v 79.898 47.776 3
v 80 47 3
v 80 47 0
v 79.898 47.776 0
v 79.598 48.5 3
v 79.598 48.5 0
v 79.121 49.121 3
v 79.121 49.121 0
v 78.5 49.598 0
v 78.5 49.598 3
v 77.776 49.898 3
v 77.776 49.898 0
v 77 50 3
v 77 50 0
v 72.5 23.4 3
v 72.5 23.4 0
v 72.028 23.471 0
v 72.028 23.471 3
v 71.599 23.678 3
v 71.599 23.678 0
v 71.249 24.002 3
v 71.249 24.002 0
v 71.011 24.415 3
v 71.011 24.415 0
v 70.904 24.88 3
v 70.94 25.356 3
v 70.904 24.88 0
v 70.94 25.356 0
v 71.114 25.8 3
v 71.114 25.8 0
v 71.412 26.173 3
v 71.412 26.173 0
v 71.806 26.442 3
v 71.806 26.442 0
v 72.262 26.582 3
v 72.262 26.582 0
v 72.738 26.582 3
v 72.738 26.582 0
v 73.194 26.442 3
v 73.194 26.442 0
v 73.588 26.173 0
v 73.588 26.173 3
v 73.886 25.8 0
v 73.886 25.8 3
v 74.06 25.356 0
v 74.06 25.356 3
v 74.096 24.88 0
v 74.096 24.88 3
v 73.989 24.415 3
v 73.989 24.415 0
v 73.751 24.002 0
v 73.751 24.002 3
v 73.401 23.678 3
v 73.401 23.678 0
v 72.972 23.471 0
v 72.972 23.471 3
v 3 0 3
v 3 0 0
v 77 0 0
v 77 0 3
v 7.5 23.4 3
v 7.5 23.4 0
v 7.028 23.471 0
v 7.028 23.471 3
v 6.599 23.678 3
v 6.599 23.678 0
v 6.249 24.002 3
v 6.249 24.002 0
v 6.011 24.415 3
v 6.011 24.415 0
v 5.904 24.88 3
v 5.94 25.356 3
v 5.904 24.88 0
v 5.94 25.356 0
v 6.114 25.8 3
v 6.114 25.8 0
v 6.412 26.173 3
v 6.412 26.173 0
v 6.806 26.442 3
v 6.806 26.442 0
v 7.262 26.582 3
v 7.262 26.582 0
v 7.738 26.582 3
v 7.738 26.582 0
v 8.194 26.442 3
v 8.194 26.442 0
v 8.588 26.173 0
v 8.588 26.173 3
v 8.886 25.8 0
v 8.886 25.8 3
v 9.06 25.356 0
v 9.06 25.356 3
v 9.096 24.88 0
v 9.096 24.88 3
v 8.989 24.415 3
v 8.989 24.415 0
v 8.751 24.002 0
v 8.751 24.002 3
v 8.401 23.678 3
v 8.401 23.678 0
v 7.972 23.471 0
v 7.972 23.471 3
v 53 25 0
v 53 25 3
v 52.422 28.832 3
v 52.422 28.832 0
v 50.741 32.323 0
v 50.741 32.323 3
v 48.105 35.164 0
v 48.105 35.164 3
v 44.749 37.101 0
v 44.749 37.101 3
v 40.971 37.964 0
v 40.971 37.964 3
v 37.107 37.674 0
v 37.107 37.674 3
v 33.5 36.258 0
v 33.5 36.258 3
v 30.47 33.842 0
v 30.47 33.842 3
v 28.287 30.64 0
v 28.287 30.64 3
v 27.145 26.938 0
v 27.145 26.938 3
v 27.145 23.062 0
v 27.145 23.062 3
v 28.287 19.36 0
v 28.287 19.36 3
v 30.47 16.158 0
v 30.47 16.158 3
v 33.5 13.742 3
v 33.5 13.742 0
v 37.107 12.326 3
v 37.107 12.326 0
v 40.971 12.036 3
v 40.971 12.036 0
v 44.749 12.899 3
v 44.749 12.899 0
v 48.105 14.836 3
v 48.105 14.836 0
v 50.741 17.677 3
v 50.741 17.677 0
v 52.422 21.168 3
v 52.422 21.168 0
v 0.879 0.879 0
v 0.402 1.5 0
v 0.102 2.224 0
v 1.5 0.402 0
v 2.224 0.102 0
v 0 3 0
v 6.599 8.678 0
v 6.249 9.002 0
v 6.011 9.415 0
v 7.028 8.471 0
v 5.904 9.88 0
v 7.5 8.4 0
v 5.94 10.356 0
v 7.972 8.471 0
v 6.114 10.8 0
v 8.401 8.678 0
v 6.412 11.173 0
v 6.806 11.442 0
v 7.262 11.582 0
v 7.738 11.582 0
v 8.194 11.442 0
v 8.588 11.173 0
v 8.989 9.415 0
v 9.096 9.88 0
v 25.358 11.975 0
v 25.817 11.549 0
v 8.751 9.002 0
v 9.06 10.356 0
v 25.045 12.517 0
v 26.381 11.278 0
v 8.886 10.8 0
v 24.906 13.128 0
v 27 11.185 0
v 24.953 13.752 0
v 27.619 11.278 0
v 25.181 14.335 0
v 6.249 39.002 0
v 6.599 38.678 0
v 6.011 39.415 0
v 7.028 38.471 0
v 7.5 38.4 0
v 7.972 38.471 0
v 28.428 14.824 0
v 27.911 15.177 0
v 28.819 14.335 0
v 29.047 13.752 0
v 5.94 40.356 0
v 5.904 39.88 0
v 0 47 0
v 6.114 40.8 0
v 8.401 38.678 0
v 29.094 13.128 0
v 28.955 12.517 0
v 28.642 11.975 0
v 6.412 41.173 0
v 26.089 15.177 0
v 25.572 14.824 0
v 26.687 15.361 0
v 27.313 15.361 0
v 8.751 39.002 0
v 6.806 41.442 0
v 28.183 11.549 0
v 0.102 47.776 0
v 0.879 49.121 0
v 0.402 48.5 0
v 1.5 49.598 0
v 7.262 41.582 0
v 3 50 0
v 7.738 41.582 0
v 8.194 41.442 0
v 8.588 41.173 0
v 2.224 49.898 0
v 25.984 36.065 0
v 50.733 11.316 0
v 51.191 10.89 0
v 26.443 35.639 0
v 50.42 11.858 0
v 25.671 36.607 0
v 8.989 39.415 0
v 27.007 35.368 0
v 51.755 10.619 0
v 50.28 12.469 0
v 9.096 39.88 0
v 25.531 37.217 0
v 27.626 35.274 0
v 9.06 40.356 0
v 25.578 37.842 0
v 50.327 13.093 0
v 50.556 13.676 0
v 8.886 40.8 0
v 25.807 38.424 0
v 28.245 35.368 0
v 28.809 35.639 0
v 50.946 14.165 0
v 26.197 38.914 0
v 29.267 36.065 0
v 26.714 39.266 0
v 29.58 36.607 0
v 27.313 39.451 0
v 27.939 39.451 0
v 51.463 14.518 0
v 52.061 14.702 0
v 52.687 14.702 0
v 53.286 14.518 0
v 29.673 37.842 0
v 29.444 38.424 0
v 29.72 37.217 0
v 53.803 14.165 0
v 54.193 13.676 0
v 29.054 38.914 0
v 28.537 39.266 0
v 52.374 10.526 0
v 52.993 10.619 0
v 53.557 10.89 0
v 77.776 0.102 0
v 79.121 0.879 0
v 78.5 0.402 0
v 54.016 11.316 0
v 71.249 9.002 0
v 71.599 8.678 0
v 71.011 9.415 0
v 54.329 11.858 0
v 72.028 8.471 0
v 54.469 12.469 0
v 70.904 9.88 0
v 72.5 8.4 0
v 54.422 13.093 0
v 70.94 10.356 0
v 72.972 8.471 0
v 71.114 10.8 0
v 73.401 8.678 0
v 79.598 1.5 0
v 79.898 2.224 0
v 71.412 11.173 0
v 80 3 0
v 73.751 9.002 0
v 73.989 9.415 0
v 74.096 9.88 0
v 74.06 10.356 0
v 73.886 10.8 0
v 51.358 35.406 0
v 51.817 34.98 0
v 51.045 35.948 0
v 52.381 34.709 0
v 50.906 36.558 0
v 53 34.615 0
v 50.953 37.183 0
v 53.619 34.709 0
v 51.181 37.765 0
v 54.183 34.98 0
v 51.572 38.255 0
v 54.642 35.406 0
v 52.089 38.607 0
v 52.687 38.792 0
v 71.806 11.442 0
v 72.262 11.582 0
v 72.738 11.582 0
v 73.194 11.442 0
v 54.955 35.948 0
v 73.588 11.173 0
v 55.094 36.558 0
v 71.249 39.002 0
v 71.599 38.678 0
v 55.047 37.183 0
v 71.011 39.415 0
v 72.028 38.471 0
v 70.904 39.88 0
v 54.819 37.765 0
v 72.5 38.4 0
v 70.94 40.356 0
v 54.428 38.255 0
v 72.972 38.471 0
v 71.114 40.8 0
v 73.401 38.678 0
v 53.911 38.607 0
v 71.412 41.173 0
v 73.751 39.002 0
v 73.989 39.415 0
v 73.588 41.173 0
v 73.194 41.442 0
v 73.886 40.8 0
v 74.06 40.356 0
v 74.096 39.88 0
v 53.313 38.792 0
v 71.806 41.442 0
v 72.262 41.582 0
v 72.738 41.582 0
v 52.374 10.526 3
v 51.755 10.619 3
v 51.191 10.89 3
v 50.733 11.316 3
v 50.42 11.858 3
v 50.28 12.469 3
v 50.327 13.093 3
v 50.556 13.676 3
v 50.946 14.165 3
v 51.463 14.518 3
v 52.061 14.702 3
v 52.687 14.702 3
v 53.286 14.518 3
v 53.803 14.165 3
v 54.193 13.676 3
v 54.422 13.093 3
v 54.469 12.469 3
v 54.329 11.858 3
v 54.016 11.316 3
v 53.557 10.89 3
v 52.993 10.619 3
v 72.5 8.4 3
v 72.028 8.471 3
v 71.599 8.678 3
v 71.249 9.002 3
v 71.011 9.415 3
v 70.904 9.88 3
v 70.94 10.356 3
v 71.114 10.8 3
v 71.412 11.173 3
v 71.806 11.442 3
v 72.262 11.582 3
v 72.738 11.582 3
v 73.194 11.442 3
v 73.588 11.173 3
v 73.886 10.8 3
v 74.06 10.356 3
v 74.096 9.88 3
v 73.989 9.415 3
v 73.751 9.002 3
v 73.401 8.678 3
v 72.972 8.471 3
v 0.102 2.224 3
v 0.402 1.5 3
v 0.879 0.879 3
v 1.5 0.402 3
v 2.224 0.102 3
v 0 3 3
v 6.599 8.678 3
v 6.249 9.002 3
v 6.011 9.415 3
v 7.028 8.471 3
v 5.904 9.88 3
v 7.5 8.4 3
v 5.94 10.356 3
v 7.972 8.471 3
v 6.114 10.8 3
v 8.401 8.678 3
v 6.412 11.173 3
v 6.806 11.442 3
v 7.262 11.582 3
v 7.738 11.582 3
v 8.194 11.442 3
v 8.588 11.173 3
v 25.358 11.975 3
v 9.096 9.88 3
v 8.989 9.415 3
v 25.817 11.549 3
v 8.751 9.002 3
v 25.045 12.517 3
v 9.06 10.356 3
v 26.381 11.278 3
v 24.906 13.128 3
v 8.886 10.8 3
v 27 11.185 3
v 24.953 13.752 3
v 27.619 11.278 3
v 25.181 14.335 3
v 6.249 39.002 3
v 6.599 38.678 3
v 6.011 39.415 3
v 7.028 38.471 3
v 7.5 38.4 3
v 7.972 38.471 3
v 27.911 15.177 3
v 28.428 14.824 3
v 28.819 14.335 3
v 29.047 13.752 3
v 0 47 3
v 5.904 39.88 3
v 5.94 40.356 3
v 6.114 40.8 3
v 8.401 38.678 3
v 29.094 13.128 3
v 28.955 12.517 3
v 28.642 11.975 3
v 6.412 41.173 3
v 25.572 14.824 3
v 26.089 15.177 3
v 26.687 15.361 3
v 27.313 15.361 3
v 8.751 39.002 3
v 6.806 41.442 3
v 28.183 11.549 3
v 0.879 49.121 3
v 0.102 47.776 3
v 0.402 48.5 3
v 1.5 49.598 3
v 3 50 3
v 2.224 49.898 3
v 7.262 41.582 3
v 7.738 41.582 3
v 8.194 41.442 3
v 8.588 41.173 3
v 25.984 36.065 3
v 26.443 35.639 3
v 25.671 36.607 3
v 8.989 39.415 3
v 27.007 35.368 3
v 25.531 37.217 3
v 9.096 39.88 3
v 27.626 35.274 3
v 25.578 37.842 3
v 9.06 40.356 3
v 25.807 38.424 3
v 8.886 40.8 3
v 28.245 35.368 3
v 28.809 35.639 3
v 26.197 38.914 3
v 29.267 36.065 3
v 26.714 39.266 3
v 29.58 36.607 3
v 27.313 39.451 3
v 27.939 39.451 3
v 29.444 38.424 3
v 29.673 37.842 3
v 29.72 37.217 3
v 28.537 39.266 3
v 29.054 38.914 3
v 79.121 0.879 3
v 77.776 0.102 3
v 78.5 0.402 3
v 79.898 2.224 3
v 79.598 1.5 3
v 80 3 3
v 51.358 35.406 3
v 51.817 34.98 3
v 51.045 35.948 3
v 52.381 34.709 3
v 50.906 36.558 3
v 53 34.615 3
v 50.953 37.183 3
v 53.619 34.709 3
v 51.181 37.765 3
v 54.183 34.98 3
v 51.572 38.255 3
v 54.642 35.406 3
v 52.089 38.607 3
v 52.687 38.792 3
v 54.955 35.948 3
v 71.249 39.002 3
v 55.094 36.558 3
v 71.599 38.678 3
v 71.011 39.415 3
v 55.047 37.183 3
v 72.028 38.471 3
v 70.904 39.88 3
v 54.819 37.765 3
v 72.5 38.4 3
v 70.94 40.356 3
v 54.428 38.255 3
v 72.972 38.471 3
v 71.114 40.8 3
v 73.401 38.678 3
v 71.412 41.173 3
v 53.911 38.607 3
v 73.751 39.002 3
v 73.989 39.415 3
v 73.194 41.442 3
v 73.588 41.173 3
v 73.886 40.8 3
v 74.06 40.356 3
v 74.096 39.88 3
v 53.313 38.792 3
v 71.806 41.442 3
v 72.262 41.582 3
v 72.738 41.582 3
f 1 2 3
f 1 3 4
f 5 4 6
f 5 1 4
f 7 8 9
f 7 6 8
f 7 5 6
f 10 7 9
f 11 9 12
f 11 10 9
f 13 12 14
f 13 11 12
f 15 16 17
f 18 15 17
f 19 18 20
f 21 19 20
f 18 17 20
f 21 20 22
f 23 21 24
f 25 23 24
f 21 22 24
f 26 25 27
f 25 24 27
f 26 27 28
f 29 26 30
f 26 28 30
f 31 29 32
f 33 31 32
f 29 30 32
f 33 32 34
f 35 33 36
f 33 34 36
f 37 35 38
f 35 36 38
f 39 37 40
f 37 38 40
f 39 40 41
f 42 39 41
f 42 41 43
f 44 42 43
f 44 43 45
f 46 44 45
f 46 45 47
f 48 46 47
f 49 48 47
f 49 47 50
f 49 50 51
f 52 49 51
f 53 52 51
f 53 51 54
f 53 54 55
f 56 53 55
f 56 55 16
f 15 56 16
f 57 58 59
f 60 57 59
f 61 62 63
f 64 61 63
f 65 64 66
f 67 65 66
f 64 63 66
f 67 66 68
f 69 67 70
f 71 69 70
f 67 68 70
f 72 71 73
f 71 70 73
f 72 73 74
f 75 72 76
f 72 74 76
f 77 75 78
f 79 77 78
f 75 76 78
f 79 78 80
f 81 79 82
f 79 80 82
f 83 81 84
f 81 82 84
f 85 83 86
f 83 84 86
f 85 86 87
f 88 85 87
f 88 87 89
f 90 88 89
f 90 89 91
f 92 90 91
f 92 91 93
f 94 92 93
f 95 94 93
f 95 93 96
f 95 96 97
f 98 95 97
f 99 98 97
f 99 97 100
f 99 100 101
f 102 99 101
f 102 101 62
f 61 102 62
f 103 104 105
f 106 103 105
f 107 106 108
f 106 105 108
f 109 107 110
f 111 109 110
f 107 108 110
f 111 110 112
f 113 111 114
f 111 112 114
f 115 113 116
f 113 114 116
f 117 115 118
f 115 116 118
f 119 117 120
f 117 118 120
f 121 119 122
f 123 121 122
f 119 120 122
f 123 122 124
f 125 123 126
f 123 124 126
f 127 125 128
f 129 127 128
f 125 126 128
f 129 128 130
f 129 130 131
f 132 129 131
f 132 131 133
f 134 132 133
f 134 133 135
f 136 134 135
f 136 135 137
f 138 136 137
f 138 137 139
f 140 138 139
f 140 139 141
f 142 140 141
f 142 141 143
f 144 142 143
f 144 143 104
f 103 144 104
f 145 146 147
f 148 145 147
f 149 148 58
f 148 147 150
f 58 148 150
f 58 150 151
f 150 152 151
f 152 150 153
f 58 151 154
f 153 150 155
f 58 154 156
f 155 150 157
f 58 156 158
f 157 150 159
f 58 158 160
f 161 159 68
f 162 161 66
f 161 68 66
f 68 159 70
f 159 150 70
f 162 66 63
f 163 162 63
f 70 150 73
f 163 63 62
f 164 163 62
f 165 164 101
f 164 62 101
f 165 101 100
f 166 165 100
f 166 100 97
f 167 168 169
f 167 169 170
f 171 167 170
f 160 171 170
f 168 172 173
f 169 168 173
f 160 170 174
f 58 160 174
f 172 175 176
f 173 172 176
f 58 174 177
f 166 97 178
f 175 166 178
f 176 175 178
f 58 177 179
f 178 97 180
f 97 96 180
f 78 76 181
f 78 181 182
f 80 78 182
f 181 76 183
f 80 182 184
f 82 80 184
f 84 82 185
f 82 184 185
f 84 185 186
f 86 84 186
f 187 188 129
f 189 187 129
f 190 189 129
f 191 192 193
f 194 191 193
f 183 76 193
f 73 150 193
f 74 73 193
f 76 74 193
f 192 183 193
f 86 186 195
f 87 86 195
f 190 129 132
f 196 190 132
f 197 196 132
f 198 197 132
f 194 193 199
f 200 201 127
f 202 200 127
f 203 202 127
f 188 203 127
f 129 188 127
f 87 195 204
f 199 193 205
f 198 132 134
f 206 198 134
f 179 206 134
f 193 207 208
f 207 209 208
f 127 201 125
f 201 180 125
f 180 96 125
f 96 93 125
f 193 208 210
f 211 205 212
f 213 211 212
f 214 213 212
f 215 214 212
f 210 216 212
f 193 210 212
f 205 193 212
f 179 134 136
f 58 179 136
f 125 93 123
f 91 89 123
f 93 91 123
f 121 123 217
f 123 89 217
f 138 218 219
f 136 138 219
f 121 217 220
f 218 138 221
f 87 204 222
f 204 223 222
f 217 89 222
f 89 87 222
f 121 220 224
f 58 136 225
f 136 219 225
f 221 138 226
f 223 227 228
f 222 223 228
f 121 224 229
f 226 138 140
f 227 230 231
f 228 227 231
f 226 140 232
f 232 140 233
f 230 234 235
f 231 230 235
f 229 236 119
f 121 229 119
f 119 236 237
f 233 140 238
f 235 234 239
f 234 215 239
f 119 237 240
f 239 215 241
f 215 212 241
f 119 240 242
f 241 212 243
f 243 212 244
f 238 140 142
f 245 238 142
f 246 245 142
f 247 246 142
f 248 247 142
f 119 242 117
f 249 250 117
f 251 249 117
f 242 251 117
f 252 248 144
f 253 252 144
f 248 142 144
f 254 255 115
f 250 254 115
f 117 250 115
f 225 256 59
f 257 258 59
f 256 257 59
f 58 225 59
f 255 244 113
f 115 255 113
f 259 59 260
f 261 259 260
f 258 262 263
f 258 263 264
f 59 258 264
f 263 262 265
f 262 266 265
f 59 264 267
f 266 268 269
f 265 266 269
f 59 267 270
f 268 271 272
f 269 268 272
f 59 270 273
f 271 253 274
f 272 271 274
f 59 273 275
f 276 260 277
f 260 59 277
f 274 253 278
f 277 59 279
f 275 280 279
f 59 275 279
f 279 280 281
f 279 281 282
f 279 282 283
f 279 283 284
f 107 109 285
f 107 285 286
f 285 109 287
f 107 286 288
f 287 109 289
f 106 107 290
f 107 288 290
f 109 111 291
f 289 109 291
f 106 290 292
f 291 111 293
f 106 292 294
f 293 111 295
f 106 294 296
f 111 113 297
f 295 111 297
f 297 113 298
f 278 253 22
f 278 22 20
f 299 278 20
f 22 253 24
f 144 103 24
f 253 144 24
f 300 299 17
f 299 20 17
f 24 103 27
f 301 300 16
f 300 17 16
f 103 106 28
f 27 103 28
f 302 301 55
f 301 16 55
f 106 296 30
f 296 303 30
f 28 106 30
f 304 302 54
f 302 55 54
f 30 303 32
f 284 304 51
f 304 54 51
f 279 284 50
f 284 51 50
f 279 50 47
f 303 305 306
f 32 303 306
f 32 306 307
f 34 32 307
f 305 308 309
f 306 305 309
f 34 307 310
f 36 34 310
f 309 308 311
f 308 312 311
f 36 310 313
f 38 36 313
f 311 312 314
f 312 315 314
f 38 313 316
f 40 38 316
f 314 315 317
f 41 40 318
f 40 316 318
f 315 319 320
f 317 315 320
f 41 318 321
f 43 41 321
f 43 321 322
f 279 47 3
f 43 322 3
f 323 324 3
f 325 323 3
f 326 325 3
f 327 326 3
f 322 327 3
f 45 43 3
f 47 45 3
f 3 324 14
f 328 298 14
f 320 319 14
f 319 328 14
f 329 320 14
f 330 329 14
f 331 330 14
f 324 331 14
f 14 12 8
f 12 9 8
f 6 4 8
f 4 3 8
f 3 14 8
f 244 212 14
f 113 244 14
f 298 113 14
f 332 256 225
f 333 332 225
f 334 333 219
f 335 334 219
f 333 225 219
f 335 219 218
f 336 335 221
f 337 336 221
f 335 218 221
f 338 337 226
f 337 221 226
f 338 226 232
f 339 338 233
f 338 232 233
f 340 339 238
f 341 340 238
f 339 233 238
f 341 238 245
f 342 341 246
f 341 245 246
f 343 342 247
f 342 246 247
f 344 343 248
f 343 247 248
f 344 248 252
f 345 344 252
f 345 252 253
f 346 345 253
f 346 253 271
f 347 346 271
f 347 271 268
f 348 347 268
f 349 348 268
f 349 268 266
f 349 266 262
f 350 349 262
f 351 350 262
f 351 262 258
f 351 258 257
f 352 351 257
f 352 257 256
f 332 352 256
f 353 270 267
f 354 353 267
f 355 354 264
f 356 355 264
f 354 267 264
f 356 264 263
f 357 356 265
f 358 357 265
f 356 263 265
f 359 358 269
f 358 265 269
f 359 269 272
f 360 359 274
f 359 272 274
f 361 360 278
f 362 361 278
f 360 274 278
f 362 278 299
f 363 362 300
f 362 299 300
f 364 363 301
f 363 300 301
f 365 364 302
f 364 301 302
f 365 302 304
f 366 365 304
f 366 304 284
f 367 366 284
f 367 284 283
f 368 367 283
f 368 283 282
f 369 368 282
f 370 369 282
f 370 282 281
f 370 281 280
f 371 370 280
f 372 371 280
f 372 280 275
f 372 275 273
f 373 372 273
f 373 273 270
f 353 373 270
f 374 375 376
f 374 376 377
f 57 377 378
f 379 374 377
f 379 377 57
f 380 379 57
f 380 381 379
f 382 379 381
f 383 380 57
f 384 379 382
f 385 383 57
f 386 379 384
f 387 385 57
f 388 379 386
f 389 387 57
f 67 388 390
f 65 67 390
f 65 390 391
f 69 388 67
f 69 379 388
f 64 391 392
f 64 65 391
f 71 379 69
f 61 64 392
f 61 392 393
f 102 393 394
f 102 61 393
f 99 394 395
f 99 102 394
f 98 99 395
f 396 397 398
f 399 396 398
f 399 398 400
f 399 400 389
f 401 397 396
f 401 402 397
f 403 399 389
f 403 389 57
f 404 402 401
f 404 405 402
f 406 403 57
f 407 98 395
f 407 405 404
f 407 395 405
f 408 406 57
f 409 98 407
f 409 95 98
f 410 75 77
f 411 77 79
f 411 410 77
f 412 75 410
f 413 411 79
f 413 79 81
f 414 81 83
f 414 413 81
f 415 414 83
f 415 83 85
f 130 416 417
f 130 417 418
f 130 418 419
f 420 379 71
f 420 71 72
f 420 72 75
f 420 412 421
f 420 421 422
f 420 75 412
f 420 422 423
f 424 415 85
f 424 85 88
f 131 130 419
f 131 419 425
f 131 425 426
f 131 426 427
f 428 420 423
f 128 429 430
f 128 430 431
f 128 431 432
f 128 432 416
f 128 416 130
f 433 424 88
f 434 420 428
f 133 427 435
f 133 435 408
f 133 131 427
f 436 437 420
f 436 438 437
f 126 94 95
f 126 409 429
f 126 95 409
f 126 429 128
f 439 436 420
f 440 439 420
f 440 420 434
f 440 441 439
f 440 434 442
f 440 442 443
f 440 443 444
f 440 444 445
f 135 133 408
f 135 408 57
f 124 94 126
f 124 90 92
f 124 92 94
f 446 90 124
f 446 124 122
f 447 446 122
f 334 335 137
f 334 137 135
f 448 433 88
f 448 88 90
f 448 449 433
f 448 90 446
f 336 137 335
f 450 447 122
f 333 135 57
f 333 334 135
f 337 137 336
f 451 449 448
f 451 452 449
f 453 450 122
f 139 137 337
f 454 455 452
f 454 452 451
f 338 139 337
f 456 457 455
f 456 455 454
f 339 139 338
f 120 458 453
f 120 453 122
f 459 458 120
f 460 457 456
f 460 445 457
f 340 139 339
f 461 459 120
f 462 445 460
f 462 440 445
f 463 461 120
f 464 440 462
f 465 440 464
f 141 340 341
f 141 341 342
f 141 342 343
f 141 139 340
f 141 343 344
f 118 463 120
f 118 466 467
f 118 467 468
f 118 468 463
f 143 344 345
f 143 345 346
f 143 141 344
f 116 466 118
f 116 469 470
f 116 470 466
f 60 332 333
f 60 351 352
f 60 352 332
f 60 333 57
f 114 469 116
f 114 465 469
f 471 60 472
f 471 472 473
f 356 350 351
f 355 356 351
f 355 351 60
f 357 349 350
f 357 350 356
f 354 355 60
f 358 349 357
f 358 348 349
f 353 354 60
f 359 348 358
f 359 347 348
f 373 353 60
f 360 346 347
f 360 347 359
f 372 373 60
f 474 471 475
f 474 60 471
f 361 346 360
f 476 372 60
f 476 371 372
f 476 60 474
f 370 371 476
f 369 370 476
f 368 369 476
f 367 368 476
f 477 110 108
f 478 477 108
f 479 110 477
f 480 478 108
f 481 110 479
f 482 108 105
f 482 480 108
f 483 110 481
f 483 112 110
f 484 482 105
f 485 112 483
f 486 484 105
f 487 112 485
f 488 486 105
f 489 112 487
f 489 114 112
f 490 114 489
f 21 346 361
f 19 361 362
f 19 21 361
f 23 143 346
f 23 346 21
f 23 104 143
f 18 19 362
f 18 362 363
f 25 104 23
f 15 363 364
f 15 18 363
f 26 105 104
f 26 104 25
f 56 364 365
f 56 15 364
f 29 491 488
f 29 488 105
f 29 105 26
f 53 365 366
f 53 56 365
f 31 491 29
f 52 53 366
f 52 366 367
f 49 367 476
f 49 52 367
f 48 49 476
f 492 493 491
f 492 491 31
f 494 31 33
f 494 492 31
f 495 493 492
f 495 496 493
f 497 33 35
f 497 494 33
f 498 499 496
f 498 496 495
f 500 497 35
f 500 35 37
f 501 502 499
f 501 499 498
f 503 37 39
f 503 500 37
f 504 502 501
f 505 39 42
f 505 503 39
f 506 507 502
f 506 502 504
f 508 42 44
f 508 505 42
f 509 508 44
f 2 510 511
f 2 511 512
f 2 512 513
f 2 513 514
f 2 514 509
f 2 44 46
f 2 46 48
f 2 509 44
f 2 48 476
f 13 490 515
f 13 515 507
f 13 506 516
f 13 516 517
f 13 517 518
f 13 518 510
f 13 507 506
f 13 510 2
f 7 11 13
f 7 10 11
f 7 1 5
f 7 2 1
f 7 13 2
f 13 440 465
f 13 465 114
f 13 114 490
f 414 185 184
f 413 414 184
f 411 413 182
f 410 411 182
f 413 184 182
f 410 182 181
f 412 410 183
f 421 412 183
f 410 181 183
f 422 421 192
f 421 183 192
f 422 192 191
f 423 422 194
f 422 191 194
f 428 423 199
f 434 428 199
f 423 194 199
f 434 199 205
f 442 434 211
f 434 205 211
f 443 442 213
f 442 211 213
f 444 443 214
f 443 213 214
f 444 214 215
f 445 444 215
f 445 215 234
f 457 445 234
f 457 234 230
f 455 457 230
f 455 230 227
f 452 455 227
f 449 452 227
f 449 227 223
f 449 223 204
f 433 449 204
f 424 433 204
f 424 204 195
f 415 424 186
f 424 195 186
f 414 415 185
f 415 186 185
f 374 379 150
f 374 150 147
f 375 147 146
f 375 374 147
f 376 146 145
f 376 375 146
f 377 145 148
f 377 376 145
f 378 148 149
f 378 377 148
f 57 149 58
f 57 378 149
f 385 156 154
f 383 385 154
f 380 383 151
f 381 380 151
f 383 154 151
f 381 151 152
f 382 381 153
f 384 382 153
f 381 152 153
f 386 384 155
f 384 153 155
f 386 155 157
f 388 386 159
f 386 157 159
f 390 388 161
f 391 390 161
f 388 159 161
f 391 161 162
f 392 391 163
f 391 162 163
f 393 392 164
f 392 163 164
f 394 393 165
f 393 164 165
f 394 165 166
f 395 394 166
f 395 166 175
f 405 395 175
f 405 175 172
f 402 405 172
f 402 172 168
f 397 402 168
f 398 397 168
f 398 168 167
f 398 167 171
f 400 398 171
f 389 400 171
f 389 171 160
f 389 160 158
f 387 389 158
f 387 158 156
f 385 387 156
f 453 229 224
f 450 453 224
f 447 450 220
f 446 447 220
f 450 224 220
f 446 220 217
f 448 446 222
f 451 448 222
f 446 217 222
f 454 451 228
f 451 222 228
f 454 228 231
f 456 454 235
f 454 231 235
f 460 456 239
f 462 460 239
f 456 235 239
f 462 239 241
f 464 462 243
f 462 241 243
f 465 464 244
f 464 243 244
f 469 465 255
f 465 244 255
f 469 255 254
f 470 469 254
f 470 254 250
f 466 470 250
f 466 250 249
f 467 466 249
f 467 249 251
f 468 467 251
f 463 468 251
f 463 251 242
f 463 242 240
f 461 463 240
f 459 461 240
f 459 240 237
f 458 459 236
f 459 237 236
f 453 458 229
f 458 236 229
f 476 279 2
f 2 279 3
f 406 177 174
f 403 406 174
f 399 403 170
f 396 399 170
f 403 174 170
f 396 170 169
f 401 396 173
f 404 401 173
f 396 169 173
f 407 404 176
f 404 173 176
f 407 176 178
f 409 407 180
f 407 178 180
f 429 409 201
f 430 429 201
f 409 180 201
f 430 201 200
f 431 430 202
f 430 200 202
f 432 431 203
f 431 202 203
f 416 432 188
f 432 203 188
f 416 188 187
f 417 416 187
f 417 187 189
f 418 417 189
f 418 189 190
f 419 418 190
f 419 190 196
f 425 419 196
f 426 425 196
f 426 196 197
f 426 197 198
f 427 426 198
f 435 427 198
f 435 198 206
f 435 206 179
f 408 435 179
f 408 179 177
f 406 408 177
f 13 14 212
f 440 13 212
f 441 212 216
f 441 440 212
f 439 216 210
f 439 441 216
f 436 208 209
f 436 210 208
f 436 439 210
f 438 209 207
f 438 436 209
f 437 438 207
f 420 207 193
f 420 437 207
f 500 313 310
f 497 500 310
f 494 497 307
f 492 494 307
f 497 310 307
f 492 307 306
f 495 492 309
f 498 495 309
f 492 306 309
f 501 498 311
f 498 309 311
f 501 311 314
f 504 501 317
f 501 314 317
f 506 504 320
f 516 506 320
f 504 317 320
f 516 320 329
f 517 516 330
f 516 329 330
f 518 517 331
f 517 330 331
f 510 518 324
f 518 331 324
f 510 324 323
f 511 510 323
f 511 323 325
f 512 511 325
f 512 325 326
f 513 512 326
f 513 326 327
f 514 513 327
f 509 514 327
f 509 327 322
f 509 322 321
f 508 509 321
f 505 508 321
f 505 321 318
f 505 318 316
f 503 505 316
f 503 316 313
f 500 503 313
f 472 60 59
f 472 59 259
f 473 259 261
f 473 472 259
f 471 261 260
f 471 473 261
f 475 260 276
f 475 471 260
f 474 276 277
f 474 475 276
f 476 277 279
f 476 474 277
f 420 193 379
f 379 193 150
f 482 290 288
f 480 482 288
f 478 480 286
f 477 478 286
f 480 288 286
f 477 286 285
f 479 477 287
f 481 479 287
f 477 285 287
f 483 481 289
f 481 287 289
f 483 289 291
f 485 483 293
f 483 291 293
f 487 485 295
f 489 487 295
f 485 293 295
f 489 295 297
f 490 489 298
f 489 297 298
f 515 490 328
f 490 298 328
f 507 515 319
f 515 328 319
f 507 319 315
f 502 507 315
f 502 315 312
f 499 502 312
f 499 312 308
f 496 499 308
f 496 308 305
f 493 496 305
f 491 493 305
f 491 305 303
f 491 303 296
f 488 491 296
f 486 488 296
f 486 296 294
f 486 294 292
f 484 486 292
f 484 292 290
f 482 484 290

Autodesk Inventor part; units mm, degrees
ref_plane "YZ Plane" through (0, 0, 0) normal (1, 0, 0) x (0, 1, 0)
ref_plane "XZ Plane" through (0, 0, 0) normal (0, 1, 0) x (-1, 0, 0)
ref_plane "XY Plane" through (0, 0, 0) normal (0, 0, 1) x (1, 0, 0)
sketch "スケッチ1" plane through (0, 0, 0) normal (0, 0, 1) x (1, 0, 0)
  line L0 (0, 0) -> (80, 0)
  line L1 (80, 0) -> (80, 50)
  line L2 (80, 50) -> (0, 50)
  line L3 (0, 50) -> (0, 0)
  dimension "d0" = 80
  dimension "d1" = 50
extrude "押し出し1" add sketch "スケッチ1" along normal blind 3
sketch "スケッチ2" plane through (0, 0, 3) normal (0, 0, 1) x (1, 0, 0)
  circle A0 centre (40, 25) radius 13
  line L0 (80, 50) -> (0, 50) projected
  line L1 (0, 50) -> (0, 0) projected
  dimension "d4" = 26
  dimension "d5" = 25
  dimension "d6" = 40
extrude "押し出し2" cut sketch "スケッチ2" against normal blind 3
sketch "スケッチ3" plane through (0, 0, 3) normal (0, 0, 1) x (1, 0, 0)
  circle A0 centre (40, 25) radius 13 projected
  circle A1 centre (40, 25) radius 17.5 construction
  line L0 (40, 25) -> (57.5, 25)
  line L1 (40, 25) -> (53, 36.7154) construction
  line L2 (53, 36.7154) -> (19.5714, 6.5901) construction
  line L3 (40, 25) -> (52.3744, 12.6256)
  line L4 (40, 25) -> (57.5, 25) construction
  line L5 (52.3744, 12.6256) -> (27.6256, 37.3744) construction
  circle A2 centre (53, 36.7154) radius 2.1
  circle A3 centre (27.6256, 37.3744) radius 2.1
  circle A4 centre (27, 13.2846) radius 2.1
  circle A5 centre (52.3744, 12.6256) radius 2.1
  point P0 (0, 0)
  dimension "d9" = 35
  dimension "d10" = 17.5
  dimension "d11" = 45
  dimension "d12" = 45
  dimension "d13" = 4.2
  dimension "d14" = 4.2
  dimension "d15" = 4.2
  dimension "d16" = 4.2
hole "穴1" at (27.6256, 37.3744, 3) at (53, 36.7154, 3) at (27, 13.2846, 3) at (52.3744, 12.6256, 3) direction (0, 0, -1) diameter 4.2 end through all
sketch "スケッチ4" plane through (0, 0, 3) normal (0, 0, 1) x (1, 0, 0)
  line L0 (80, 50) -> (0, 50) projected
  line L1 (15, 50) -> (15, 0) construction
  line L2 (0, 0) -> (80, 0) projected
  line L3 (65, 50) -> (65, 0) construction
  line L4 (0, 50) -> (0, 0) projected
  line L5 (80, 0) -> (80, 50) projected
  circle A0 centre (7.5, 40) radius 1.6
  circle A1 centre (7.5, 25) radius 1.6
  circle A2 centre (7.5, 10) radius 1.6
  circle A3 centre (72.5, 40) radius 1.6
  circle A4 centre (72.5, 25) radius 1.6
  circle A5 centre (72.5, 10) radius 1.6
  point P0 (40, 0)
  dimension "d24" = 15
  dimension "d25" = 15
  dimension "d26" = 3.2
  dimension "d27" = 7.5
  dimension "d28" = 10
  dimension "d29" = 3.2
  dimension "d30" = 3.2
  dimension "d31" = 25
  dimension "d32" = 10
  dimension "d33" = 7.5
  dimension "d34" = 7.5
hole "穴2" at (7.5, 40, 3) at (7.5, 25, 3) at (7.5, 10, 3) at (72.5, 40, 3) at (72.5, 25, 3) at (72.5, 10, 3) direction (0, 0, -1) diameter 3.2 end through all
fillet "フィレット1" radius 3 4 edges at (0, 50, 1.5) (80, 50, 1.5) (80, 0, 1.5) (0, 0, 1.5)
properties part number "射出_モーター固定1" material "アルミニウム 6061"
